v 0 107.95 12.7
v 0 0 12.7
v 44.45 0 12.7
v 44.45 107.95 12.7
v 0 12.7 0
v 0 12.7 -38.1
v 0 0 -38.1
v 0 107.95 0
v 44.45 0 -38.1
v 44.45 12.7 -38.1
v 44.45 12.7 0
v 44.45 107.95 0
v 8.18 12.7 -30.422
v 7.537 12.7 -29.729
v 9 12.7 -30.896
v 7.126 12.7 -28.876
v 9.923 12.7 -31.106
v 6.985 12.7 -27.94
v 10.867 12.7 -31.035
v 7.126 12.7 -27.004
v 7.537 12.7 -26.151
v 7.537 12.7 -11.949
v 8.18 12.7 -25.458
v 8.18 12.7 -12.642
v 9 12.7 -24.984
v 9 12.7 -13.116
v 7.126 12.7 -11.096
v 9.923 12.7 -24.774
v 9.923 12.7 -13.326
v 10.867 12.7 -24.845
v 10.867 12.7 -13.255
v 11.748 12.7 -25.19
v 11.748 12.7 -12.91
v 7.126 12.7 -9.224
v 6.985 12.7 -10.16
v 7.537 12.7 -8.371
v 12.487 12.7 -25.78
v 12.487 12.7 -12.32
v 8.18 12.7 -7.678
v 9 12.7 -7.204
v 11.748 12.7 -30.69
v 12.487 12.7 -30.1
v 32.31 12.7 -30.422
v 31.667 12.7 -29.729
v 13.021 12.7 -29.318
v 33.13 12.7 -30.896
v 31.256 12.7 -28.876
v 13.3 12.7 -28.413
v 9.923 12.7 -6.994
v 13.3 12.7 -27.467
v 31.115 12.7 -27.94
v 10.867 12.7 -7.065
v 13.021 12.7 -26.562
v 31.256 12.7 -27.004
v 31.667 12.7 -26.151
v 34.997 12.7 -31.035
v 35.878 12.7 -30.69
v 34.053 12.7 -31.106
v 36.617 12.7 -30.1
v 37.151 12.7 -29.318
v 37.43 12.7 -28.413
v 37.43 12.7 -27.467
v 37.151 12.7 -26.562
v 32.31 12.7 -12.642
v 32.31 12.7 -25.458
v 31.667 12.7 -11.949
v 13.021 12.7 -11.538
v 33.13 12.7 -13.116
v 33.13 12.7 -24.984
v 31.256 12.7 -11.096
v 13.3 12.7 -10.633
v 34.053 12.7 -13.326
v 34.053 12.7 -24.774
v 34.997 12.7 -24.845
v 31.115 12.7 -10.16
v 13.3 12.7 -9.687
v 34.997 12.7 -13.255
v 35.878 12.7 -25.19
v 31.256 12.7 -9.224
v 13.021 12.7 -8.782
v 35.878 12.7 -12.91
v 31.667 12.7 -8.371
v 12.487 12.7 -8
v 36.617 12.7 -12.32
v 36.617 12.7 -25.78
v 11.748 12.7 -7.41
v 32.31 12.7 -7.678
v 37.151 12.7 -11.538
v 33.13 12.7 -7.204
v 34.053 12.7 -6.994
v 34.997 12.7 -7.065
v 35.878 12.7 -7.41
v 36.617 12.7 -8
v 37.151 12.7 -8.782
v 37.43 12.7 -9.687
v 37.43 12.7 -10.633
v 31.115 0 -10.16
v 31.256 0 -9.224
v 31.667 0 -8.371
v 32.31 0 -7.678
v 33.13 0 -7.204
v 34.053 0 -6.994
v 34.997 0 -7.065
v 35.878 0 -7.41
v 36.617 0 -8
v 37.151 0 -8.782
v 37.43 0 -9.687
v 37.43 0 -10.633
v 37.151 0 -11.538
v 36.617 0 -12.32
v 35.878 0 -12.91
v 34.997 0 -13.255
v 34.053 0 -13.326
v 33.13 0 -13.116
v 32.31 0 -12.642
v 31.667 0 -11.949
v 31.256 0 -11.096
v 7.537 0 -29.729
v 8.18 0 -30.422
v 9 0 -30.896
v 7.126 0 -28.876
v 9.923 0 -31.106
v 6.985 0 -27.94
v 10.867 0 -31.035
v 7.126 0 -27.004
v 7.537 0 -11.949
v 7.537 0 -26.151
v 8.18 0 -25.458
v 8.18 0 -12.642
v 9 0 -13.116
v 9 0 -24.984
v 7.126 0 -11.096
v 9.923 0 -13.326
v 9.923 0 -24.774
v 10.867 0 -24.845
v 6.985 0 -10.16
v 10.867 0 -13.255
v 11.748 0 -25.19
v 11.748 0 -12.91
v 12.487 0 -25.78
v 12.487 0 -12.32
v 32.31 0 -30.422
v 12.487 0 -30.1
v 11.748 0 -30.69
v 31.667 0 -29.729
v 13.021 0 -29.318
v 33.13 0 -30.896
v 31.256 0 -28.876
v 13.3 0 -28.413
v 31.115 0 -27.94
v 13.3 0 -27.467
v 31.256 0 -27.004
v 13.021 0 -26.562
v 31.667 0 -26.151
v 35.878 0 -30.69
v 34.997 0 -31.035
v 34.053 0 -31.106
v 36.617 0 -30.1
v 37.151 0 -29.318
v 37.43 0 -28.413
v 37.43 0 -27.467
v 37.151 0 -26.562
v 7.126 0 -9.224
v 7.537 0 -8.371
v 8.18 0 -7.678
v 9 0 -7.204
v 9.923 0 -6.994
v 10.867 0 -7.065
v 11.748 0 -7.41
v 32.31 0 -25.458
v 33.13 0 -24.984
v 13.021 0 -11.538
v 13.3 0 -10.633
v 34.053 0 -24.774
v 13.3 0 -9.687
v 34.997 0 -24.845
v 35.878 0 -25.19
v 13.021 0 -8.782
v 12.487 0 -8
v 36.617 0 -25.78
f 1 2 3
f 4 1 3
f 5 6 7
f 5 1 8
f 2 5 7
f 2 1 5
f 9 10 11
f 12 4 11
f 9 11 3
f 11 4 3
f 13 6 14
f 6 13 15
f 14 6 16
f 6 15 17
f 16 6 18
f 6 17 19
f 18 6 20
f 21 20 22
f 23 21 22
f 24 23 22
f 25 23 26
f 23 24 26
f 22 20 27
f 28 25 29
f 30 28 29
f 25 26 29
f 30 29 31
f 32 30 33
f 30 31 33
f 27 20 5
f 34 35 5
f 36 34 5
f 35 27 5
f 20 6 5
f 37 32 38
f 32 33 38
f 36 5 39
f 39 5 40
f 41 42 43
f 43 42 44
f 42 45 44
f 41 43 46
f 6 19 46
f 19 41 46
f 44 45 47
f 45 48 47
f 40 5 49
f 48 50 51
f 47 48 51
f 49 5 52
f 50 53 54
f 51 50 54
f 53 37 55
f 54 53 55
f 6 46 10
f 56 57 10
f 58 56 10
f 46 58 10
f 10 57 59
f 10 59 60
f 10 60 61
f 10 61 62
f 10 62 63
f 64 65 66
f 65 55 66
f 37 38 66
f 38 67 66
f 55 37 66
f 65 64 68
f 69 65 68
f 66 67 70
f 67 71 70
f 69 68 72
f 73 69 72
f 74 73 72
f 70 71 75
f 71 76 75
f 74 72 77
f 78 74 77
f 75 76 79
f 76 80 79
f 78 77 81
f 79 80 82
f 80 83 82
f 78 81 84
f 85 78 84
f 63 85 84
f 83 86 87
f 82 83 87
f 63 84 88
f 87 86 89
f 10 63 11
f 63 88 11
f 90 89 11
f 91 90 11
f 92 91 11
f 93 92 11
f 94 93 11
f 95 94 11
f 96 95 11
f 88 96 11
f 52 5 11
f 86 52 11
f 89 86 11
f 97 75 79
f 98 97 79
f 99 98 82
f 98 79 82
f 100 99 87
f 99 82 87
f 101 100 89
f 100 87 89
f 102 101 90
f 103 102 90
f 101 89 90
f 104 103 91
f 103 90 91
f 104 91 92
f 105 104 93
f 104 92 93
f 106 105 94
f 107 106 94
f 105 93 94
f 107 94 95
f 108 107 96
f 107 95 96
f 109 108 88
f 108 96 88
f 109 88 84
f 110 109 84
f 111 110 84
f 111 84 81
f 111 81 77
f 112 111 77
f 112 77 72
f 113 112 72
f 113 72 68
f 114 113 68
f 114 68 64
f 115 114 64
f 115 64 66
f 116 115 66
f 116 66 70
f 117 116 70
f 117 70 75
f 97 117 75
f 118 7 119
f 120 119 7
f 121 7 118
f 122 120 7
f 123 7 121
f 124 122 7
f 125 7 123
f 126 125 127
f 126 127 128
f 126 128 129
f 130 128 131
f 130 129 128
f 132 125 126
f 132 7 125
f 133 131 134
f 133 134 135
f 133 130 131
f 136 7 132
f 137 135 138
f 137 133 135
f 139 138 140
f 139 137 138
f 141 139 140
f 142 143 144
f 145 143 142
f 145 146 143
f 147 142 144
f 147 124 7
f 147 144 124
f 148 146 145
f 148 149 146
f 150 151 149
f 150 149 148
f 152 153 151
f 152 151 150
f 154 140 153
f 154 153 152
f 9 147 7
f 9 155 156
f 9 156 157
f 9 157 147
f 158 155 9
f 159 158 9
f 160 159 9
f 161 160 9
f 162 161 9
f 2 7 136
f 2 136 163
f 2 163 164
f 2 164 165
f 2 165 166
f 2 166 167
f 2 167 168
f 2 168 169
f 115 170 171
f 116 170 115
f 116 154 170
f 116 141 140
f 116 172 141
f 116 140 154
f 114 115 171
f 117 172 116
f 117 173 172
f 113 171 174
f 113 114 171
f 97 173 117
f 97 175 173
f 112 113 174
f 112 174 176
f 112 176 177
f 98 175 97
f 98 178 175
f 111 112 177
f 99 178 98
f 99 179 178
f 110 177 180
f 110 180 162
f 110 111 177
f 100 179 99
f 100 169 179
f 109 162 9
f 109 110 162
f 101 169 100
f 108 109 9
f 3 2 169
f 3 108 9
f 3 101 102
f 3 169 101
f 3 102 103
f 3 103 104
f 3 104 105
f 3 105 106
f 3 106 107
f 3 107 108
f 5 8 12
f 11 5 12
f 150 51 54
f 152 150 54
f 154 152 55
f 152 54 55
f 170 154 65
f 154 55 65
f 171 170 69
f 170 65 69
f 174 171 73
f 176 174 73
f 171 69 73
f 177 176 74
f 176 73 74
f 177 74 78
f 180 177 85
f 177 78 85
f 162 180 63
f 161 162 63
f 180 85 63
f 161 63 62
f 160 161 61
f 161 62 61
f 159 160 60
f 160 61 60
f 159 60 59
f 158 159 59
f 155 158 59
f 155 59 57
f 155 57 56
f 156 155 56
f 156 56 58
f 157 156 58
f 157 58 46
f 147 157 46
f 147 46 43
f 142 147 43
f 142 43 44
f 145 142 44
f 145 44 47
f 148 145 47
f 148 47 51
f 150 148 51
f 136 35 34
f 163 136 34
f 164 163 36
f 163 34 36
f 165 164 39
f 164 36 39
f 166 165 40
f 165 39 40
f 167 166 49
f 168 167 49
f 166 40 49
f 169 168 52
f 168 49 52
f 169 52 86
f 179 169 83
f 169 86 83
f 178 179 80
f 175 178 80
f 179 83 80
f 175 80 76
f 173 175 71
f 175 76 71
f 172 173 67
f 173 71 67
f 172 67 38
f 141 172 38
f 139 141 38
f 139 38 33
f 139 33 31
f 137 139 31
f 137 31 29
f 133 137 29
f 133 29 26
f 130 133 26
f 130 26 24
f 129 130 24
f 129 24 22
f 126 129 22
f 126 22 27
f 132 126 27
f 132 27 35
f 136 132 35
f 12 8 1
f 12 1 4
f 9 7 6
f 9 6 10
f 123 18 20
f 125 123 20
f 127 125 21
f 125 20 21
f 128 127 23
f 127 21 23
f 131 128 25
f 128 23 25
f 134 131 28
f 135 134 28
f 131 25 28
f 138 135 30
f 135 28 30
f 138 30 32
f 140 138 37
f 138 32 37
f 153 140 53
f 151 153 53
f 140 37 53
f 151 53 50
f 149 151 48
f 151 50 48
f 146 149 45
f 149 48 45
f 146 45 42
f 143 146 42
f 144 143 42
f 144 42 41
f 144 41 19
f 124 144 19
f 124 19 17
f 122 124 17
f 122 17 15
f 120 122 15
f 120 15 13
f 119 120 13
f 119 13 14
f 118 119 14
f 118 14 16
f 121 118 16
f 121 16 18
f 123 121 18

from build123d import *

# Parameters (mm, degrees)
F0_W     = 44.45
F0_H     = 107.95
F1_DEPTH = 12.7
F2_W     = 44.45
F2_H     = 12.7
F3_DEPTH = 38.1
F4_R     = 3.175
F5_DEPTH = 12.701


with BuildPart() as f1:
    # F0 (on Top) → F1 (new body)
    with BuildSketch(Plane.XY):
        with Locations((22.225, 53.975)):
            Rectangle(F0_W, F0_H)
    extrude(amount=F1_DEPTH)

    # F2 (on face) → F3 (join)
    with BuildSketch(Plane(origin=(0, 0, 0), x_dir=(1, 0, 0), z_dir=(0, 0, -1))):
        with Locations((22.225, -6.35)):
            Rectangle(F2_W, F2_H)
    extrude(amount=F3_DEPTH)

    # F4 (on face) → F5 (cut, through all)
    with BuildSketch(Plane(origin=(0, 12.7, 0), x_dir=(-1, 0, 0), z_dir=(0, 1, 0))):
        with Locations((-34.29, -10.16)):
            Circle(F4_R)
        with Locations((-34.29, -27.94)):
            Circle(F4_R)
        with Locations((-10.16, -10.16)):
            Circle(F4_R)
        with Locations((-10.16, -27.94)):
            Circle(F4_R)
    extrude(amount=-F5_DEPTH, mode=Mode.SUBTRACT)


solid = f1.part
